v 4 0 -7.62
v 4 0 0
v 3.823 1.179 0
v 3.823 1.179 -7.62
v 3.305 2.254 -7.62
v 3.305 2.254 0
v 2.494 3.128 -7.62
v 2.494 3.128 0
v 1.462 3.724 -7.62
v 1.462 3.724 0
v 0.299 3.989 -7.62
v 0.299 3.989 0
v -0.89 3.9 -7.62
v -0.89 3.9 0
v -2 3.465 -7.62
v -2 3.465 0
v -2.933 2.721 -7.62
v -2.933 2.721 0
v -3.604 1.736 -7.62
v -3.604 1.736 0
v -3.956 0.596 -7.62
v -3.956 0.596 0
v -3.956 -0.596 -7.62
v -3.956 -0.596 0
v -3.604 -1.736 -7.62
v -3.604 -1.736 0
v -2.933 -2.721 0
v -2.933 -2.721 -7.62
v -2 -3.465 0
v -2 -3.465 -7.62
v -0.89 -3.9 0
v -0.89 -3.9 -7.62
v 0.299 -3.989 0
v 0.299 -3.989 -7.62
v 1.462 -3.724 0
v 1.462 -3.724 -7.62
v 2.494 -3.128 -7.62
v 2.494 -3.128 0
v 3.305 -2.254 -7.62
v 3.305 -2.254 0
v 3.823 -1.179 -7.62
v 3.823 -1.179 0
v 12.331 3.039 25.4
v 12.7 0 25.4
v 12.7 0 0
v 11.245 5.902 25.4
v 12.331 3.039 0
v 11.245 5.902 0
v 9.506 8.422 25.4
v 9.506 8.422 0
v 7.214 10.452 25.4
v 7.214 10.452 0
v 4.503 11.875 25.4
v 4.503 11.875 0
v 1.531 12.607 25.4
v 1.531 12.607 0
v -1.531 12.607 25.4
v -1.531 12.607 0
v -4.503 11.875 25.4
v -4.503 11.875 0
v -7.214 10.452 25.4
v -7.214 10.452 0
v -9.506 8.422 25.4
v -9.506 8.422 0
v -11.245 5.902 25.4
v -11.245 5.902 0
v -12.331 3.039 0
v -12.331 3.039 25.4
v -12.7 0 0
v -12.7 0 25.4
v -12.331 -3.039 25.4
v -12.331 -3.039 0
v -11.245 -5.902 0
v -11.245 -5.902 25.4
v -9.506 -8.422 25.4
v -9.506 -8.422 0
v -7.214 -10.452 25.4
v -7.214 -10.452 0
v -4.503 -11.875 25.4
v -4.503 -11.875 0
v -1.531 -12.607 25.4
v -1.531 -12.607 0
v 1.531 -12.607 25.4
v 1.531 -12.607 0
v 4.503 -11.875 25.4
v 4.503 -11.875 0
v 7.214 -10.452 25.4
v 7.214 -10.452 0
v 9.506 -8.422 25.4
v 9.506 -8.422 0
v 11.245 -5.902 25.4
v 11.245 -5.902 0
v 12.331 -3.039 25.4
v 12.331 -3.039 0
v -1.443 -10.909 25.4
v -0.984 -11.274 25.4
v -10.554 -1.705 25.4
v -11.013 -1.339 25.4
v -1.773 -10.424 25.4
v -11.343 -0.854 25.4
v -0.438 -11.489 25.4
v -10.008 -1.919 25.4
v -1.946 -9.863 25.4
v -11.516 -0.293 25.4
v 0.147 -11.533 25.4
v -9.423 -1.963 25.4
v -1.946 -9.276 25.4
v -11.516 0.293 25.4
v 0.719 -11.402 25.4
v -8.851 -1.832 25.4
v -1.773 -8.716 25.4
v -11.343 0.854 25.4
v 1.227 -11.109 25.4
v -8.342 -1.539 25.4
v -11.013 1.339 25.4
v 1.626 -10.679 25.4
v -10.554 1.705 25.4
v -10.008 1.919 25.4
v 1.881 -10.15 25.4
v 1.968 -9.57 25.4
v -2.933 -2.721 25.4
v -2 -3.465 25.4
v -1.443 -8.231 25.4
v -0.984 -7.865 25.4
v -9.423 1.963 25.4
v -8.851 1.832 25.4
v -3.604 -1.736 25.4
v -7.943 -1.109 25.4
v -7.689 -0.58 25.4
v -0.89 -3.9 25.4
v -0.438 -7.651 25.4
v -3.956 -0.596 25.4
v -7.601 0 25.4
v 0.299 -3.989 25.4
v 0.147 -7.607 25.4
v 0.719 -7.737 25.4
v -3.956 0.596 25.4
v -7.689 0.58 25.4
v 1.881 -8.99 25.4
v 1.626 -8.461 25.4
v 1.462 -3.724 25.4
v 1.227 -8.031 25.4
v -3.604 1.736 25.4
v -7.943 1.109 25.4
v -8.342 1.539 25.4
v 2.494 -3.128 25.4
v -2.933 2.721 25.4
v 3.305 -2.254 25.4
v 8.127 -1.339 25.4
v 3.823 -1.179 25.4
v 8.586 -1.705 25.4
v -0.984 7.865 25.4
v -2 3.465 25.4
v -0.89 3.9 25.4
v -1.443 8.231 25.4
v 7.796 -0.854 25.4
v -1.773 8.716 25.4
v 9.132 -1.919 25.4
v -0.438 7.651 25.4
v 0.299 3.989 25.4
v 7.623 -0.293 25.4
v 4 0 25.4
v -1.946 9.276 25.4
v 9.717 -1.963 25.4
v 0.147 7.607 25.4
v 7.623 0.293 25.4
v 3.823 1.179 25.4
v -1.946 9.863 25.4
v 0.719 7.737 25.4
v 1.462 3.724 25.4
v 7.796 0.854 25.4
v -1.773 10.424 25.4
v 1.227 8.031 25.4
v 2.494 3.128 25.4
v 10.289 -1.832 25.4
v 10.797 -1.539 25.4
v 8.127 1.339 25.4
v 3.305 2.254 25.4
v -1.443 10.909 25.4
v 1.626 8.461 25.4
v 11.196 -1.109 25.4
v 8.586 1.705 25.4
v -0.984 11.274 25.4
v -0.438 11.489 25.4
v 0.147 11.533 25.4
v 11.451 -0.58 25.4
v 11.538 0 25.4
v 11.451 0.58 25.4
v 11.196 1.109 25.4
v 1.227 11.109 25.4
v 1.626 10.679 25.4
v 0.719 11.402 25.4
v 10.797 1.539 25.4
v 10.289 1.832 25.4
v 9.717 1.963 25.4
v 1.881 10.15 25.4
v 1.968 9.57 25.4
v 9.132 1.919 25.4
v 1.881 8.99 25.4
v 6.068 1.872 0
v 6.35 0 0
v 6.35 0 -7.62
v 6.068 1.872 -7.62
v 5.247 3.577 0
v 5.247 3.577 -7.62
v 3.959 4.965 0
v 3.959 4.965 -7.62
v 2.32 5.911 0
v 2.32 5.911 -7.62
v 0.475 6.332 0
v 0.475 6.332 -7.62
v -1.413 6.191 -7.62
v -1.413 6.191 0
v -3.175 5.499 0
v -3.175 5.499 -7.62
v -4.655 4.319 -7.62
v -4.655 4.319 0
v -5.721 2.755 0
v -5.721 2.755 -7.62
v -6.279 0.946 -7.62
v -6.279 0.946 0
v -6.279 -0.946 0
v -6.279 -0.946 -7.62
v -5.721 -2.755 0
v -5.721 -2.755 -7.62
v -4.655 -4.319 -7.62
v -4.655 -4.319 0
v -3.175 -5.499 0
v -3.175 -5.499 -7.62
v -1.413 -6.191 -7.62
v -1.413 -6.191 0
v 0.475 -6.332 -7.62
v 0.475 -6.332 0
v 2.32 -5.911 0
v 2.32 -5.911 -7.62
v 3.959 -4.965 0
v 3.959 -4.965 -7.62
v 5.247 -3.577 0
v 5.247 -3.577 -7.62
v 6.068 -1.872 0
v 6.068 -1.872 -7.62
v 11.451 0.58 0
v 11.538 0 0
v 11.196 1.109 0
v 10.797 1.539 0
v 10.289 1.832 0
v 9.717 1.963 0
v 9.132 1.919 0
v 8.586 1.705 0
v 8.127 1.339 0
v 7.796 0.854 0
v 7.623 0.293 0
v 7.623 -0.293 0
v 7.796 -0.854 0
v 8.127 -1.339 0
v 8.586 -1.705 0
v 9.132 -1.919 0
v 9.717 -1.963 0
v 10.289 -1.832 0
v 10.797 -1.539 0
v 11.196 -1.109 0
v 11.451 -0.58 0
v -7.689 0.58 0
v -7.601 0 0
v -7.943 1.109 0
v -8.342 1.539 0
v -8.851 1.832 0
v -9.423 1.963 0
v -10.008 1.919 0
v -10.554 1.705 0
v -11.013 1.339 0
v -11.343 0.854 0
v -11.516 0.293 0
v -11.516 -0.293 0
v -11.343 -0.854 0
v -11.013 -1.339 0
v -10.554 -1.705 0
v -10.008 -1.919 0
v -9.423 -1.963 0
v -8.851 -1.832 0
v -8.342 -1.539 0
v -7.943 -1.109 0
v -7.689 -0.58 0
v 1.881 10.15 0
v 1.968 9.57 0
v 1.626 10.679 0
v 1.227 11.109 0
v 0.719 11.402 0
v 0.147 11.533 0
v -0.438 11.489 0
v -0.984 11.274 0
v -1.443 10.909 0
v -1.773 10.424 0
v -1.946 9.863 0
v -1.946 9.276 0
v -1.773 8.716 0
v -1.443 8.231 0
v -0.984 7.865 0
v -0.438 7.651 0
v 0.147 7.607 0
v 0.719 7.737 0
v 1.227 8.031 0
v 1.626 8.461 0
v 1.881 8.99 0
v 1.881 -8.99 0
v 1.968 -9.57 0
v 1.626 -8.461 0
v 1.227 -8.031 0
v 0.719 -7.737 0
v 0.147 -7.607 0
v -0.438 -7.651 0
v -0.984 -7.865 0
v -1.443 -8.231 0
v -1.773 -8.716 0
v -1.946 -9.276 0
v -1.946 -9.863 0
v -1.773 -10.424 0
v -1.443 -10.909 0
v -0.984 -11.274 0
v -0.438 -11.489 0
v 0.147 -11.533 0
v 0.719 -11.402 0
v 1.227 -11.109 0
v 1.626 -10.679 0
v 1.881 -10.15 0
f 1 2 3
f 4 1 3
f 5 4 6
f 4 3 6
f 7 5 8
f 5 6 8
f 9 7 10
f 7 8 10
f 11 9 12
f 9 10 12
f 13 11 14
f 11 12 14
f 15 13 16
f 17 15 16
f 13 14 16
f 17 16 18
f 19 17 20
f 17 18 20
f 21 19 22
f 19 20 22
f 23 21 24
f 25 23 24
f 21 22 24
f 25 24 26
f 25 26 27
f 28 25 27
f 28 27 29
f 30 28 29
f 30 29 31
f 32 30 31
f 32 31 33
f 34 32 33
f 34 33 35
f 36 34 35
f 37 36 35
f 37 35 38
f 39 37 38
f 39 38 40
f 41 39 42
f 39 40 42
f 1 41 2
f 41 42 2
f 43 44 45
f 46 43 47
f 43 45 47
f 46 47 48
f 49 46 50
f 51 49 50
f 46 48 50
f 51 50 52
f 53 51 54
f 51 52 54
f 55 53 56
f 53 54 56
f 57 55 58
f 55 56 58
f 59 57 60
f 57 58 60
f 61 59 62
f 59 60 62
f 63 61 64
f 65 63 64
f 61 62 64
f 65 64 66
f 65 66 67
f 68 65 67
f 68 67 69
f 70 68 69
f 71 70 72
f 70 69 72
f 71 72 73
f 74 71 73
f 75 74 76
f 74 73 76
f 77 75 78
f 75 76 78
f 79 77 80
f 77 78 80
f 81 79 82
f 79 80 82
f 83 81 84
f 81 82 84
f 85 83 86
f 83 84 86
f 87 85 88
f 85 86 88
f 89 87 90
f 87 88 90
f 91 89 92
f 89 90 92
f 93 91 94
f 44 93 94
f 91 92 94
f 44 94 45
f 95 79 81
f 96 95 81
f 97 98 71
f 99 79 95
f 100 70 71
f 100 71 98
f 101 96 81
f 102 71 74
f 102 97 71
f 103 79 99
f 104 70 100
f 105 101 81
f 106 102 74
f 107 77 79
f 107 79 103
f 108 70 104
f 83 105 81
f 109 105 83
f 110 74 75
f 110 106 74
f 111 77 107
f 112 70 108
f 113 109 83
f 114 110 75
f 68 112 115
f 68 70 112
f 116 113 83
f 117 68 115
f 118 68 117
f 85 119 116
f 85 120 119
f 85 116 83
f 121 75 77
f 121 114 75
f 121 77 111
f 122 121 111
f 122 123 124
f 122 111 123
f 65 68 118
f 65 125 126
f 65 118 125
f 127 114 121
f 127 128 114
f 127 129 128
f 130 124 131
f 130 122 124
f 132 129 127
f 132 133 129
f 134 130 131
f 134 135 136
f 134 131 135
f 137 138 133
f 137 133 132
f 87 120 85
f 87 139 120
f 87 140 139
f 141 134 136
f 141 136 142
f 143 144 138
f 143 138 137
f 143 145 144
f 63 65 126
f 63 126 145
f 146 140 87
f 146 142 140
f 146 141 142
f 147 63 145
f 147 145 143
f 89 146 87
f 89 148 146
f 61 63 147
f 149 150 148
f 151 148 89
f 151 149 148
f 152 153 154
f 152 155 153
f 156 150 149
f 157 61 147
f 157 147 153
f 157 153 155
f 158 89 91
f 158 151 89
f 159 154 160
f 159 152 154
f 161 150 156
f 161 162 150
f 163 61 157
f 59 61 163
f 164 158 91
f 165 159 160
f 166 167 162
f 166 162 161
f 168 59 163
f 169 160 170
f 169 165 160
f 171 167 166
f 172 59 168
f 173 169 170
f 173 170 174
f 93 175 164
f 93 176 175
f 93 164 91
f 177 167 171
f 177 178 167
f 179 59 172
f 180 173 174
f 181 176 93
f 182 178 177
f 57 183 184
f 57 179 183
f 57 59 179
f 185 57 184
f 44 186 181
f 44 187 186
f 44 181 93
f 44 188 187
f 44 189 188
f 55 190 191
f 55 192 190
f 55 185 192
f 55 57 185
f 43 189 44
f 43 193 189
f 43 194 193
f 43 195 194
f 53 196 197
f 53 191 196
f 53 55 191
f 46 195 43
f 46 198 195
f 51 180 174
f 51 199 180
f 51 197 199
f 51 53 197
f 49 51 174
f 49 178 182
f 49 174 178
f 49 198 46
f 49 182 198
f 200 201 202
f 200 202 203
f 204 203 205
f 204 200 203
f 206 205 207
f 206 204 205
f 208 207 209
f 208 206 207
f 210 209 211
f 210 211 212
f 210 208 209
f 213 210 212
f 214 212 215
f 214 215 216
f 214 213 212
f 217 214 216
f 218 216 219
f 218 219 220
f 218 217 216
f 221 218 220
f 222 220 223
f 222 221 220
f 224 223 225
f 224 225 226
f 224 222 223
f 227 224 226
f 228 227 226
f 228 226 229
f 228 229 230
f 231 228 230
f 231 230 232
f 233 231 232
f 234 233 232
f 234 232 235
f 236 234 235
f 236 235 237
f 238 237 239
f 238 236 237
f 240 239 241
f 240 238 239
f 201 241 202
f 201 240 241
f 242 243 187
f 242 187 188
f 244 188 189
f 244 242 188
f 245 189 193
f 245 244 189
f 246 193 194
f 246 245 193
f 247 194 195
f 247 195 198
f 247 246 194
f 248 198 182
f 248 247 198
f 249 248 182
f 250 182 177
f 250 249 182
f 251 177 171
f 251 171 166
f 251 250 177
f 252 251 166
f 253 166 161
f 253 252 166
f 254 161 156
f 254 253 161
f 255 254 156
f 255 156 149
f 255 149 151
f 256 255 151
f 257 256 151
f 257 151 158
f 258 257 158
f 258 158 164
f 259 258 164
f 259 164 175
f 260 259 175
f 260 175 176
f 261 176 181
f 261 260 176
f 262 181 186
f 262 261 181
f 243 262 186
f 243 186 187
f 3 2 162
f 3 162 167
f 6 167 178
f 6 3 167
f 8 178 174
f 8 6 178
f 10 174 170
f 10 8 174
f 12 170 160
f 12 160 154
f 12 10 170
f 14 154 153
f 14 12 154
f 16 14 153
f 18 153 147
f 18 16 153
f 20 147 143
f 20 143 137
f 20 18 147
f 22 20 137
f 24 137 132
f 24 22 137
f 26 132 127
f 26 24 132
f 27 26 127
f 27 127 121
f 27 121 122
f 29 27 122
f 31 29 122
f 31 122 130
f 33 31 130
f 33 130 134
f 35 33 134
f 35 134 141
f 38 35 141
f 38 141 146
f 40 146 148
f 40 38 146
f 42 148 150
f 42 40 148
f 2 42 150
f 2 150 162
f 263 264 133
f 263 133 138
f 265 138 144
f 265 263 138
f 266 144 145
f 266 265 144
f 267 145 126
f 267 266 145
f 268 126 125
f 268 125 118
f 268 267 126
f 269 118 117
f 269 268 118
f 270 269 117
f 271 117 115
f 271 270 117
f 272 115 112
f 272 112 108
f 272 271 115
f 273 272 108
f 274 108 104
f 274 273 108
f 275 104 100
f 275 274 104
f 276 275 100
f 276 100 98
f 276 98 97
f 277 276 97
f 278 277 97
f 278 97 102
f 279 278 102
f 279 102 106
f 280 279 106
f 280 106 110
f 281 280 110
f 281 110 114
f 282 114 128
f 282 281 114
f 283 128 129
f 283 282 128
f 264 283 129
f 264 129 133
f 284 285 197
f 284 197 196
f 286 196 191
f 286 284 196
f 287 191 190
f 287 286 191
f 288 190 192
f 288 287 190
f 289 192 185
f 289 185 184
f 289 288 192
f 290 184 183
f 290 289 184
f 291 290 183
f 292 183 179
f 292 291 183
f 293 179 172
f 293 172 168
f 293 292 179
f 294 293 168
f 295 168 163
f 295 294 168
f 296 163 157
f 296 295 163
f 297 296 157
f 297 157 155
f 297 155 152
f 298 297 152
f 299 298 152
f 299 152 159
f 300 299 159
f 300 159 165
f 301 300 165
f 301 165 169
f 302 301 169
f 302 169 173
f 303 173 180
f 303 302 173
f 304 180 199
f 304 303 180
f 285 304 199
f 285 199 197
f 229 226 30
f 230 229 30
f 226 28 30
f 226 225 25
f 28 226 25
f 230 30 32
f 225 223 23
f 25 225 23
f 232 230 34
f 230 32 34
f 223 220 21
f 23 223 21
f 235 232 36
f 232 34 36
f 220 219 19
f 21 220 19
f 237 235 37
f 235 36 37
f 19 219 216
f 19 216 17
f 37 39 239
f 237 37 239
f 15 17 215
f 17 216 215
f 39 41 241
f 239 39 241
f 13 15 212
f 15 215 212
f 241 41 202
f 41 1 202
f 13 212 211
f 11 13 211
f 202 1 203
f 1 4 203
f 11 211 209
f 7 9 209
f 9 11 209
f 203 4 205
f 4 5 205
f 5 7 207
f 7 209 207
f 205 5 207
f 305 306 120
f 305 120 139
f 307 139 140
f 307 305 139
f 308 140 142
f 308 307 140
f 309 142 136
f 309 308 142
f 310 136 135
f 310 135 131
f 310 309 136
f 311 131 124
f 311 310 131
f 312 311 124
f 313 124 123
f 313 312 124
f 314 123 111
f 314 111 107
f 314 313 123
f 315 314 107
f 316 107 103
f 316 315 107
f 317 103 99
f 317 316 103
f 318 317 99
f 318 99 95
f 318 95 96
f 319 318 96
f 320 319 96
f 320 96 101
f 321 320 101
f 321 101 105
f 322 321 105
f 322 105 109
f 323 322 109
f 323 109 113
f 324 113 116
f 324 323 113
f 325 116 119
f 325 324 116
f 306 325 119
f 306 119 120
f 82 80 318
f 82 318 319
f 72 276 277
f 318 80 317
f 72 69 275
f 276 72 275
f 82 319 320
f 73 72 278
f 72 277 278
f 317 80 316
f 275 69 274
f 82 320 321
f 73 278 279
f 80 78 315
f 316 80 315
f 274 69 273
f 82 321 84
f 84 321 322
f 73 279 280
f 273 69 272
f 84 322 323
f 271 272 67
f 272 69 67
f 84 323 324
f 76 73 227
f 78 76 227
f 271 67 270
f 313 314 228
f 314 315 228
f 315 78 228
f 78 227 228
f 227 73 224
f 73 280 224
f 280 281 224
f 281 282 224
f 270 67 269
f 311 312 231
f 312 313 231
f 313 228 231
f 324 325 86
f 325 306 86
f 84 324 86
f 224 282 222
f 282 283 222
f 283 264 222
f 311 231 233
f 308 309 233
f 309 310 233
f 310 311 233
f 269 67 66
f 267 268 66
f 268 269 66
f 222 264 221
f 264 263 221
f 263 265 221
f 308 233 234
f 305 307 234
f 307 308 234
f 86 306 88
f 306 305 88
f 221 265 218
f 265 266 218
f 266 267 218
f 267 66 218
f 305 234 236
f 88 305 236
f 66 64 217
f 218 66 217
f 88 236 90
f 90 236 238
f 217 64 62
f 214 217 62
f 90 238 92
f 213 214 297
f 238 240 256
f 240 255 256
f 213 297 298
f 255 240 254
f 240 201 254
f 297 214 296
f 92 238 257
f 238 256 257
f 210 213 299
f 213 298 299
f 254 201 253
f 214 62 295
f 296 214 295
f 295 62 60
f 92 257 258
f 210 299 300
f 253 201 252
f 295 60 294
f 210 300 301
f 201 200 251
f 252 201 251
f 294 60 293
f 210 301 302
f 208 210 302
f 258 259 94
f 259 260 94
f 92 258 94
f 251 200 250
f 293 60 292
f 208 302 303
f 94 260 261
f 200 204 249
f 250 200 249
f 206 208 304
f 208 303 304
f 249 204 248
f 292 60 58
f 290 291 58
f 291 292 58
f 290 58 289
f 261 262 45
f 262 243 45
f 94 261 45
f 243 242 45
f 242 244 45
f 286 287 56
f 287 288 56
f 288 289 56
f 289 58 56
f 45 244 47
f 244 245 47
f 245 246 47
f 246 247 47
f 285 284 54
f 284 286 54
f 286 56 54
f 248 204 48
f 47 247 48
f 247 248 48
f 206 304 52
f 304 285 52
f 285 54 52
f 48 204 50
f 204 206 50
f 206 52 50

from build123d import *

# Parameters (mm, degrees)
F0_R     = 12.7
F0_R_2   = 1.968379445
F0_R_3   = 6.35
F0_R_4   = 4.0005
F1_DEPTH = 25.4
F2_DEPTH = 7.62


with BuildPart() as f1:
    # F0 (on Top) → F1 (new body)
    with BuildSketch(Plane.XY):
        Circle(F0_R)
        with Locations((0, -9.5697641373)):
            Circle(F0_R_2, mode=Mode.SUBTRACT)
        with Locations((-9.5697641373, 0)):
            Circle(F0_R_2, mode=Mode.SUBTRACT)
        Circle(F0_R_3, mode=Mode.SUBTRACT)
        with Locations((9.5697641373, 0)):
            Circle(F0_R_2, mode=Mode.SUBTRACT)
        with Locations((0, 9.5697641373)):
            Circle(F0_R_2, mode=Mode.SUBTRACT)
        Circle(F0_R_3)
        Circle(F0_R_4, mode=Mode.SUBTRACT)
    extrude(amount=F1_DEPTH)

    # F0 (on Top) → F2 (join)
    with BuildSketch(Plane.XY):
        Circle(F0_R_3)
        Circle(F0_R_4, mode=Mode.SUBTRACT)
    extrude(amount=-F2_DEPTH)


solid = f1.part
